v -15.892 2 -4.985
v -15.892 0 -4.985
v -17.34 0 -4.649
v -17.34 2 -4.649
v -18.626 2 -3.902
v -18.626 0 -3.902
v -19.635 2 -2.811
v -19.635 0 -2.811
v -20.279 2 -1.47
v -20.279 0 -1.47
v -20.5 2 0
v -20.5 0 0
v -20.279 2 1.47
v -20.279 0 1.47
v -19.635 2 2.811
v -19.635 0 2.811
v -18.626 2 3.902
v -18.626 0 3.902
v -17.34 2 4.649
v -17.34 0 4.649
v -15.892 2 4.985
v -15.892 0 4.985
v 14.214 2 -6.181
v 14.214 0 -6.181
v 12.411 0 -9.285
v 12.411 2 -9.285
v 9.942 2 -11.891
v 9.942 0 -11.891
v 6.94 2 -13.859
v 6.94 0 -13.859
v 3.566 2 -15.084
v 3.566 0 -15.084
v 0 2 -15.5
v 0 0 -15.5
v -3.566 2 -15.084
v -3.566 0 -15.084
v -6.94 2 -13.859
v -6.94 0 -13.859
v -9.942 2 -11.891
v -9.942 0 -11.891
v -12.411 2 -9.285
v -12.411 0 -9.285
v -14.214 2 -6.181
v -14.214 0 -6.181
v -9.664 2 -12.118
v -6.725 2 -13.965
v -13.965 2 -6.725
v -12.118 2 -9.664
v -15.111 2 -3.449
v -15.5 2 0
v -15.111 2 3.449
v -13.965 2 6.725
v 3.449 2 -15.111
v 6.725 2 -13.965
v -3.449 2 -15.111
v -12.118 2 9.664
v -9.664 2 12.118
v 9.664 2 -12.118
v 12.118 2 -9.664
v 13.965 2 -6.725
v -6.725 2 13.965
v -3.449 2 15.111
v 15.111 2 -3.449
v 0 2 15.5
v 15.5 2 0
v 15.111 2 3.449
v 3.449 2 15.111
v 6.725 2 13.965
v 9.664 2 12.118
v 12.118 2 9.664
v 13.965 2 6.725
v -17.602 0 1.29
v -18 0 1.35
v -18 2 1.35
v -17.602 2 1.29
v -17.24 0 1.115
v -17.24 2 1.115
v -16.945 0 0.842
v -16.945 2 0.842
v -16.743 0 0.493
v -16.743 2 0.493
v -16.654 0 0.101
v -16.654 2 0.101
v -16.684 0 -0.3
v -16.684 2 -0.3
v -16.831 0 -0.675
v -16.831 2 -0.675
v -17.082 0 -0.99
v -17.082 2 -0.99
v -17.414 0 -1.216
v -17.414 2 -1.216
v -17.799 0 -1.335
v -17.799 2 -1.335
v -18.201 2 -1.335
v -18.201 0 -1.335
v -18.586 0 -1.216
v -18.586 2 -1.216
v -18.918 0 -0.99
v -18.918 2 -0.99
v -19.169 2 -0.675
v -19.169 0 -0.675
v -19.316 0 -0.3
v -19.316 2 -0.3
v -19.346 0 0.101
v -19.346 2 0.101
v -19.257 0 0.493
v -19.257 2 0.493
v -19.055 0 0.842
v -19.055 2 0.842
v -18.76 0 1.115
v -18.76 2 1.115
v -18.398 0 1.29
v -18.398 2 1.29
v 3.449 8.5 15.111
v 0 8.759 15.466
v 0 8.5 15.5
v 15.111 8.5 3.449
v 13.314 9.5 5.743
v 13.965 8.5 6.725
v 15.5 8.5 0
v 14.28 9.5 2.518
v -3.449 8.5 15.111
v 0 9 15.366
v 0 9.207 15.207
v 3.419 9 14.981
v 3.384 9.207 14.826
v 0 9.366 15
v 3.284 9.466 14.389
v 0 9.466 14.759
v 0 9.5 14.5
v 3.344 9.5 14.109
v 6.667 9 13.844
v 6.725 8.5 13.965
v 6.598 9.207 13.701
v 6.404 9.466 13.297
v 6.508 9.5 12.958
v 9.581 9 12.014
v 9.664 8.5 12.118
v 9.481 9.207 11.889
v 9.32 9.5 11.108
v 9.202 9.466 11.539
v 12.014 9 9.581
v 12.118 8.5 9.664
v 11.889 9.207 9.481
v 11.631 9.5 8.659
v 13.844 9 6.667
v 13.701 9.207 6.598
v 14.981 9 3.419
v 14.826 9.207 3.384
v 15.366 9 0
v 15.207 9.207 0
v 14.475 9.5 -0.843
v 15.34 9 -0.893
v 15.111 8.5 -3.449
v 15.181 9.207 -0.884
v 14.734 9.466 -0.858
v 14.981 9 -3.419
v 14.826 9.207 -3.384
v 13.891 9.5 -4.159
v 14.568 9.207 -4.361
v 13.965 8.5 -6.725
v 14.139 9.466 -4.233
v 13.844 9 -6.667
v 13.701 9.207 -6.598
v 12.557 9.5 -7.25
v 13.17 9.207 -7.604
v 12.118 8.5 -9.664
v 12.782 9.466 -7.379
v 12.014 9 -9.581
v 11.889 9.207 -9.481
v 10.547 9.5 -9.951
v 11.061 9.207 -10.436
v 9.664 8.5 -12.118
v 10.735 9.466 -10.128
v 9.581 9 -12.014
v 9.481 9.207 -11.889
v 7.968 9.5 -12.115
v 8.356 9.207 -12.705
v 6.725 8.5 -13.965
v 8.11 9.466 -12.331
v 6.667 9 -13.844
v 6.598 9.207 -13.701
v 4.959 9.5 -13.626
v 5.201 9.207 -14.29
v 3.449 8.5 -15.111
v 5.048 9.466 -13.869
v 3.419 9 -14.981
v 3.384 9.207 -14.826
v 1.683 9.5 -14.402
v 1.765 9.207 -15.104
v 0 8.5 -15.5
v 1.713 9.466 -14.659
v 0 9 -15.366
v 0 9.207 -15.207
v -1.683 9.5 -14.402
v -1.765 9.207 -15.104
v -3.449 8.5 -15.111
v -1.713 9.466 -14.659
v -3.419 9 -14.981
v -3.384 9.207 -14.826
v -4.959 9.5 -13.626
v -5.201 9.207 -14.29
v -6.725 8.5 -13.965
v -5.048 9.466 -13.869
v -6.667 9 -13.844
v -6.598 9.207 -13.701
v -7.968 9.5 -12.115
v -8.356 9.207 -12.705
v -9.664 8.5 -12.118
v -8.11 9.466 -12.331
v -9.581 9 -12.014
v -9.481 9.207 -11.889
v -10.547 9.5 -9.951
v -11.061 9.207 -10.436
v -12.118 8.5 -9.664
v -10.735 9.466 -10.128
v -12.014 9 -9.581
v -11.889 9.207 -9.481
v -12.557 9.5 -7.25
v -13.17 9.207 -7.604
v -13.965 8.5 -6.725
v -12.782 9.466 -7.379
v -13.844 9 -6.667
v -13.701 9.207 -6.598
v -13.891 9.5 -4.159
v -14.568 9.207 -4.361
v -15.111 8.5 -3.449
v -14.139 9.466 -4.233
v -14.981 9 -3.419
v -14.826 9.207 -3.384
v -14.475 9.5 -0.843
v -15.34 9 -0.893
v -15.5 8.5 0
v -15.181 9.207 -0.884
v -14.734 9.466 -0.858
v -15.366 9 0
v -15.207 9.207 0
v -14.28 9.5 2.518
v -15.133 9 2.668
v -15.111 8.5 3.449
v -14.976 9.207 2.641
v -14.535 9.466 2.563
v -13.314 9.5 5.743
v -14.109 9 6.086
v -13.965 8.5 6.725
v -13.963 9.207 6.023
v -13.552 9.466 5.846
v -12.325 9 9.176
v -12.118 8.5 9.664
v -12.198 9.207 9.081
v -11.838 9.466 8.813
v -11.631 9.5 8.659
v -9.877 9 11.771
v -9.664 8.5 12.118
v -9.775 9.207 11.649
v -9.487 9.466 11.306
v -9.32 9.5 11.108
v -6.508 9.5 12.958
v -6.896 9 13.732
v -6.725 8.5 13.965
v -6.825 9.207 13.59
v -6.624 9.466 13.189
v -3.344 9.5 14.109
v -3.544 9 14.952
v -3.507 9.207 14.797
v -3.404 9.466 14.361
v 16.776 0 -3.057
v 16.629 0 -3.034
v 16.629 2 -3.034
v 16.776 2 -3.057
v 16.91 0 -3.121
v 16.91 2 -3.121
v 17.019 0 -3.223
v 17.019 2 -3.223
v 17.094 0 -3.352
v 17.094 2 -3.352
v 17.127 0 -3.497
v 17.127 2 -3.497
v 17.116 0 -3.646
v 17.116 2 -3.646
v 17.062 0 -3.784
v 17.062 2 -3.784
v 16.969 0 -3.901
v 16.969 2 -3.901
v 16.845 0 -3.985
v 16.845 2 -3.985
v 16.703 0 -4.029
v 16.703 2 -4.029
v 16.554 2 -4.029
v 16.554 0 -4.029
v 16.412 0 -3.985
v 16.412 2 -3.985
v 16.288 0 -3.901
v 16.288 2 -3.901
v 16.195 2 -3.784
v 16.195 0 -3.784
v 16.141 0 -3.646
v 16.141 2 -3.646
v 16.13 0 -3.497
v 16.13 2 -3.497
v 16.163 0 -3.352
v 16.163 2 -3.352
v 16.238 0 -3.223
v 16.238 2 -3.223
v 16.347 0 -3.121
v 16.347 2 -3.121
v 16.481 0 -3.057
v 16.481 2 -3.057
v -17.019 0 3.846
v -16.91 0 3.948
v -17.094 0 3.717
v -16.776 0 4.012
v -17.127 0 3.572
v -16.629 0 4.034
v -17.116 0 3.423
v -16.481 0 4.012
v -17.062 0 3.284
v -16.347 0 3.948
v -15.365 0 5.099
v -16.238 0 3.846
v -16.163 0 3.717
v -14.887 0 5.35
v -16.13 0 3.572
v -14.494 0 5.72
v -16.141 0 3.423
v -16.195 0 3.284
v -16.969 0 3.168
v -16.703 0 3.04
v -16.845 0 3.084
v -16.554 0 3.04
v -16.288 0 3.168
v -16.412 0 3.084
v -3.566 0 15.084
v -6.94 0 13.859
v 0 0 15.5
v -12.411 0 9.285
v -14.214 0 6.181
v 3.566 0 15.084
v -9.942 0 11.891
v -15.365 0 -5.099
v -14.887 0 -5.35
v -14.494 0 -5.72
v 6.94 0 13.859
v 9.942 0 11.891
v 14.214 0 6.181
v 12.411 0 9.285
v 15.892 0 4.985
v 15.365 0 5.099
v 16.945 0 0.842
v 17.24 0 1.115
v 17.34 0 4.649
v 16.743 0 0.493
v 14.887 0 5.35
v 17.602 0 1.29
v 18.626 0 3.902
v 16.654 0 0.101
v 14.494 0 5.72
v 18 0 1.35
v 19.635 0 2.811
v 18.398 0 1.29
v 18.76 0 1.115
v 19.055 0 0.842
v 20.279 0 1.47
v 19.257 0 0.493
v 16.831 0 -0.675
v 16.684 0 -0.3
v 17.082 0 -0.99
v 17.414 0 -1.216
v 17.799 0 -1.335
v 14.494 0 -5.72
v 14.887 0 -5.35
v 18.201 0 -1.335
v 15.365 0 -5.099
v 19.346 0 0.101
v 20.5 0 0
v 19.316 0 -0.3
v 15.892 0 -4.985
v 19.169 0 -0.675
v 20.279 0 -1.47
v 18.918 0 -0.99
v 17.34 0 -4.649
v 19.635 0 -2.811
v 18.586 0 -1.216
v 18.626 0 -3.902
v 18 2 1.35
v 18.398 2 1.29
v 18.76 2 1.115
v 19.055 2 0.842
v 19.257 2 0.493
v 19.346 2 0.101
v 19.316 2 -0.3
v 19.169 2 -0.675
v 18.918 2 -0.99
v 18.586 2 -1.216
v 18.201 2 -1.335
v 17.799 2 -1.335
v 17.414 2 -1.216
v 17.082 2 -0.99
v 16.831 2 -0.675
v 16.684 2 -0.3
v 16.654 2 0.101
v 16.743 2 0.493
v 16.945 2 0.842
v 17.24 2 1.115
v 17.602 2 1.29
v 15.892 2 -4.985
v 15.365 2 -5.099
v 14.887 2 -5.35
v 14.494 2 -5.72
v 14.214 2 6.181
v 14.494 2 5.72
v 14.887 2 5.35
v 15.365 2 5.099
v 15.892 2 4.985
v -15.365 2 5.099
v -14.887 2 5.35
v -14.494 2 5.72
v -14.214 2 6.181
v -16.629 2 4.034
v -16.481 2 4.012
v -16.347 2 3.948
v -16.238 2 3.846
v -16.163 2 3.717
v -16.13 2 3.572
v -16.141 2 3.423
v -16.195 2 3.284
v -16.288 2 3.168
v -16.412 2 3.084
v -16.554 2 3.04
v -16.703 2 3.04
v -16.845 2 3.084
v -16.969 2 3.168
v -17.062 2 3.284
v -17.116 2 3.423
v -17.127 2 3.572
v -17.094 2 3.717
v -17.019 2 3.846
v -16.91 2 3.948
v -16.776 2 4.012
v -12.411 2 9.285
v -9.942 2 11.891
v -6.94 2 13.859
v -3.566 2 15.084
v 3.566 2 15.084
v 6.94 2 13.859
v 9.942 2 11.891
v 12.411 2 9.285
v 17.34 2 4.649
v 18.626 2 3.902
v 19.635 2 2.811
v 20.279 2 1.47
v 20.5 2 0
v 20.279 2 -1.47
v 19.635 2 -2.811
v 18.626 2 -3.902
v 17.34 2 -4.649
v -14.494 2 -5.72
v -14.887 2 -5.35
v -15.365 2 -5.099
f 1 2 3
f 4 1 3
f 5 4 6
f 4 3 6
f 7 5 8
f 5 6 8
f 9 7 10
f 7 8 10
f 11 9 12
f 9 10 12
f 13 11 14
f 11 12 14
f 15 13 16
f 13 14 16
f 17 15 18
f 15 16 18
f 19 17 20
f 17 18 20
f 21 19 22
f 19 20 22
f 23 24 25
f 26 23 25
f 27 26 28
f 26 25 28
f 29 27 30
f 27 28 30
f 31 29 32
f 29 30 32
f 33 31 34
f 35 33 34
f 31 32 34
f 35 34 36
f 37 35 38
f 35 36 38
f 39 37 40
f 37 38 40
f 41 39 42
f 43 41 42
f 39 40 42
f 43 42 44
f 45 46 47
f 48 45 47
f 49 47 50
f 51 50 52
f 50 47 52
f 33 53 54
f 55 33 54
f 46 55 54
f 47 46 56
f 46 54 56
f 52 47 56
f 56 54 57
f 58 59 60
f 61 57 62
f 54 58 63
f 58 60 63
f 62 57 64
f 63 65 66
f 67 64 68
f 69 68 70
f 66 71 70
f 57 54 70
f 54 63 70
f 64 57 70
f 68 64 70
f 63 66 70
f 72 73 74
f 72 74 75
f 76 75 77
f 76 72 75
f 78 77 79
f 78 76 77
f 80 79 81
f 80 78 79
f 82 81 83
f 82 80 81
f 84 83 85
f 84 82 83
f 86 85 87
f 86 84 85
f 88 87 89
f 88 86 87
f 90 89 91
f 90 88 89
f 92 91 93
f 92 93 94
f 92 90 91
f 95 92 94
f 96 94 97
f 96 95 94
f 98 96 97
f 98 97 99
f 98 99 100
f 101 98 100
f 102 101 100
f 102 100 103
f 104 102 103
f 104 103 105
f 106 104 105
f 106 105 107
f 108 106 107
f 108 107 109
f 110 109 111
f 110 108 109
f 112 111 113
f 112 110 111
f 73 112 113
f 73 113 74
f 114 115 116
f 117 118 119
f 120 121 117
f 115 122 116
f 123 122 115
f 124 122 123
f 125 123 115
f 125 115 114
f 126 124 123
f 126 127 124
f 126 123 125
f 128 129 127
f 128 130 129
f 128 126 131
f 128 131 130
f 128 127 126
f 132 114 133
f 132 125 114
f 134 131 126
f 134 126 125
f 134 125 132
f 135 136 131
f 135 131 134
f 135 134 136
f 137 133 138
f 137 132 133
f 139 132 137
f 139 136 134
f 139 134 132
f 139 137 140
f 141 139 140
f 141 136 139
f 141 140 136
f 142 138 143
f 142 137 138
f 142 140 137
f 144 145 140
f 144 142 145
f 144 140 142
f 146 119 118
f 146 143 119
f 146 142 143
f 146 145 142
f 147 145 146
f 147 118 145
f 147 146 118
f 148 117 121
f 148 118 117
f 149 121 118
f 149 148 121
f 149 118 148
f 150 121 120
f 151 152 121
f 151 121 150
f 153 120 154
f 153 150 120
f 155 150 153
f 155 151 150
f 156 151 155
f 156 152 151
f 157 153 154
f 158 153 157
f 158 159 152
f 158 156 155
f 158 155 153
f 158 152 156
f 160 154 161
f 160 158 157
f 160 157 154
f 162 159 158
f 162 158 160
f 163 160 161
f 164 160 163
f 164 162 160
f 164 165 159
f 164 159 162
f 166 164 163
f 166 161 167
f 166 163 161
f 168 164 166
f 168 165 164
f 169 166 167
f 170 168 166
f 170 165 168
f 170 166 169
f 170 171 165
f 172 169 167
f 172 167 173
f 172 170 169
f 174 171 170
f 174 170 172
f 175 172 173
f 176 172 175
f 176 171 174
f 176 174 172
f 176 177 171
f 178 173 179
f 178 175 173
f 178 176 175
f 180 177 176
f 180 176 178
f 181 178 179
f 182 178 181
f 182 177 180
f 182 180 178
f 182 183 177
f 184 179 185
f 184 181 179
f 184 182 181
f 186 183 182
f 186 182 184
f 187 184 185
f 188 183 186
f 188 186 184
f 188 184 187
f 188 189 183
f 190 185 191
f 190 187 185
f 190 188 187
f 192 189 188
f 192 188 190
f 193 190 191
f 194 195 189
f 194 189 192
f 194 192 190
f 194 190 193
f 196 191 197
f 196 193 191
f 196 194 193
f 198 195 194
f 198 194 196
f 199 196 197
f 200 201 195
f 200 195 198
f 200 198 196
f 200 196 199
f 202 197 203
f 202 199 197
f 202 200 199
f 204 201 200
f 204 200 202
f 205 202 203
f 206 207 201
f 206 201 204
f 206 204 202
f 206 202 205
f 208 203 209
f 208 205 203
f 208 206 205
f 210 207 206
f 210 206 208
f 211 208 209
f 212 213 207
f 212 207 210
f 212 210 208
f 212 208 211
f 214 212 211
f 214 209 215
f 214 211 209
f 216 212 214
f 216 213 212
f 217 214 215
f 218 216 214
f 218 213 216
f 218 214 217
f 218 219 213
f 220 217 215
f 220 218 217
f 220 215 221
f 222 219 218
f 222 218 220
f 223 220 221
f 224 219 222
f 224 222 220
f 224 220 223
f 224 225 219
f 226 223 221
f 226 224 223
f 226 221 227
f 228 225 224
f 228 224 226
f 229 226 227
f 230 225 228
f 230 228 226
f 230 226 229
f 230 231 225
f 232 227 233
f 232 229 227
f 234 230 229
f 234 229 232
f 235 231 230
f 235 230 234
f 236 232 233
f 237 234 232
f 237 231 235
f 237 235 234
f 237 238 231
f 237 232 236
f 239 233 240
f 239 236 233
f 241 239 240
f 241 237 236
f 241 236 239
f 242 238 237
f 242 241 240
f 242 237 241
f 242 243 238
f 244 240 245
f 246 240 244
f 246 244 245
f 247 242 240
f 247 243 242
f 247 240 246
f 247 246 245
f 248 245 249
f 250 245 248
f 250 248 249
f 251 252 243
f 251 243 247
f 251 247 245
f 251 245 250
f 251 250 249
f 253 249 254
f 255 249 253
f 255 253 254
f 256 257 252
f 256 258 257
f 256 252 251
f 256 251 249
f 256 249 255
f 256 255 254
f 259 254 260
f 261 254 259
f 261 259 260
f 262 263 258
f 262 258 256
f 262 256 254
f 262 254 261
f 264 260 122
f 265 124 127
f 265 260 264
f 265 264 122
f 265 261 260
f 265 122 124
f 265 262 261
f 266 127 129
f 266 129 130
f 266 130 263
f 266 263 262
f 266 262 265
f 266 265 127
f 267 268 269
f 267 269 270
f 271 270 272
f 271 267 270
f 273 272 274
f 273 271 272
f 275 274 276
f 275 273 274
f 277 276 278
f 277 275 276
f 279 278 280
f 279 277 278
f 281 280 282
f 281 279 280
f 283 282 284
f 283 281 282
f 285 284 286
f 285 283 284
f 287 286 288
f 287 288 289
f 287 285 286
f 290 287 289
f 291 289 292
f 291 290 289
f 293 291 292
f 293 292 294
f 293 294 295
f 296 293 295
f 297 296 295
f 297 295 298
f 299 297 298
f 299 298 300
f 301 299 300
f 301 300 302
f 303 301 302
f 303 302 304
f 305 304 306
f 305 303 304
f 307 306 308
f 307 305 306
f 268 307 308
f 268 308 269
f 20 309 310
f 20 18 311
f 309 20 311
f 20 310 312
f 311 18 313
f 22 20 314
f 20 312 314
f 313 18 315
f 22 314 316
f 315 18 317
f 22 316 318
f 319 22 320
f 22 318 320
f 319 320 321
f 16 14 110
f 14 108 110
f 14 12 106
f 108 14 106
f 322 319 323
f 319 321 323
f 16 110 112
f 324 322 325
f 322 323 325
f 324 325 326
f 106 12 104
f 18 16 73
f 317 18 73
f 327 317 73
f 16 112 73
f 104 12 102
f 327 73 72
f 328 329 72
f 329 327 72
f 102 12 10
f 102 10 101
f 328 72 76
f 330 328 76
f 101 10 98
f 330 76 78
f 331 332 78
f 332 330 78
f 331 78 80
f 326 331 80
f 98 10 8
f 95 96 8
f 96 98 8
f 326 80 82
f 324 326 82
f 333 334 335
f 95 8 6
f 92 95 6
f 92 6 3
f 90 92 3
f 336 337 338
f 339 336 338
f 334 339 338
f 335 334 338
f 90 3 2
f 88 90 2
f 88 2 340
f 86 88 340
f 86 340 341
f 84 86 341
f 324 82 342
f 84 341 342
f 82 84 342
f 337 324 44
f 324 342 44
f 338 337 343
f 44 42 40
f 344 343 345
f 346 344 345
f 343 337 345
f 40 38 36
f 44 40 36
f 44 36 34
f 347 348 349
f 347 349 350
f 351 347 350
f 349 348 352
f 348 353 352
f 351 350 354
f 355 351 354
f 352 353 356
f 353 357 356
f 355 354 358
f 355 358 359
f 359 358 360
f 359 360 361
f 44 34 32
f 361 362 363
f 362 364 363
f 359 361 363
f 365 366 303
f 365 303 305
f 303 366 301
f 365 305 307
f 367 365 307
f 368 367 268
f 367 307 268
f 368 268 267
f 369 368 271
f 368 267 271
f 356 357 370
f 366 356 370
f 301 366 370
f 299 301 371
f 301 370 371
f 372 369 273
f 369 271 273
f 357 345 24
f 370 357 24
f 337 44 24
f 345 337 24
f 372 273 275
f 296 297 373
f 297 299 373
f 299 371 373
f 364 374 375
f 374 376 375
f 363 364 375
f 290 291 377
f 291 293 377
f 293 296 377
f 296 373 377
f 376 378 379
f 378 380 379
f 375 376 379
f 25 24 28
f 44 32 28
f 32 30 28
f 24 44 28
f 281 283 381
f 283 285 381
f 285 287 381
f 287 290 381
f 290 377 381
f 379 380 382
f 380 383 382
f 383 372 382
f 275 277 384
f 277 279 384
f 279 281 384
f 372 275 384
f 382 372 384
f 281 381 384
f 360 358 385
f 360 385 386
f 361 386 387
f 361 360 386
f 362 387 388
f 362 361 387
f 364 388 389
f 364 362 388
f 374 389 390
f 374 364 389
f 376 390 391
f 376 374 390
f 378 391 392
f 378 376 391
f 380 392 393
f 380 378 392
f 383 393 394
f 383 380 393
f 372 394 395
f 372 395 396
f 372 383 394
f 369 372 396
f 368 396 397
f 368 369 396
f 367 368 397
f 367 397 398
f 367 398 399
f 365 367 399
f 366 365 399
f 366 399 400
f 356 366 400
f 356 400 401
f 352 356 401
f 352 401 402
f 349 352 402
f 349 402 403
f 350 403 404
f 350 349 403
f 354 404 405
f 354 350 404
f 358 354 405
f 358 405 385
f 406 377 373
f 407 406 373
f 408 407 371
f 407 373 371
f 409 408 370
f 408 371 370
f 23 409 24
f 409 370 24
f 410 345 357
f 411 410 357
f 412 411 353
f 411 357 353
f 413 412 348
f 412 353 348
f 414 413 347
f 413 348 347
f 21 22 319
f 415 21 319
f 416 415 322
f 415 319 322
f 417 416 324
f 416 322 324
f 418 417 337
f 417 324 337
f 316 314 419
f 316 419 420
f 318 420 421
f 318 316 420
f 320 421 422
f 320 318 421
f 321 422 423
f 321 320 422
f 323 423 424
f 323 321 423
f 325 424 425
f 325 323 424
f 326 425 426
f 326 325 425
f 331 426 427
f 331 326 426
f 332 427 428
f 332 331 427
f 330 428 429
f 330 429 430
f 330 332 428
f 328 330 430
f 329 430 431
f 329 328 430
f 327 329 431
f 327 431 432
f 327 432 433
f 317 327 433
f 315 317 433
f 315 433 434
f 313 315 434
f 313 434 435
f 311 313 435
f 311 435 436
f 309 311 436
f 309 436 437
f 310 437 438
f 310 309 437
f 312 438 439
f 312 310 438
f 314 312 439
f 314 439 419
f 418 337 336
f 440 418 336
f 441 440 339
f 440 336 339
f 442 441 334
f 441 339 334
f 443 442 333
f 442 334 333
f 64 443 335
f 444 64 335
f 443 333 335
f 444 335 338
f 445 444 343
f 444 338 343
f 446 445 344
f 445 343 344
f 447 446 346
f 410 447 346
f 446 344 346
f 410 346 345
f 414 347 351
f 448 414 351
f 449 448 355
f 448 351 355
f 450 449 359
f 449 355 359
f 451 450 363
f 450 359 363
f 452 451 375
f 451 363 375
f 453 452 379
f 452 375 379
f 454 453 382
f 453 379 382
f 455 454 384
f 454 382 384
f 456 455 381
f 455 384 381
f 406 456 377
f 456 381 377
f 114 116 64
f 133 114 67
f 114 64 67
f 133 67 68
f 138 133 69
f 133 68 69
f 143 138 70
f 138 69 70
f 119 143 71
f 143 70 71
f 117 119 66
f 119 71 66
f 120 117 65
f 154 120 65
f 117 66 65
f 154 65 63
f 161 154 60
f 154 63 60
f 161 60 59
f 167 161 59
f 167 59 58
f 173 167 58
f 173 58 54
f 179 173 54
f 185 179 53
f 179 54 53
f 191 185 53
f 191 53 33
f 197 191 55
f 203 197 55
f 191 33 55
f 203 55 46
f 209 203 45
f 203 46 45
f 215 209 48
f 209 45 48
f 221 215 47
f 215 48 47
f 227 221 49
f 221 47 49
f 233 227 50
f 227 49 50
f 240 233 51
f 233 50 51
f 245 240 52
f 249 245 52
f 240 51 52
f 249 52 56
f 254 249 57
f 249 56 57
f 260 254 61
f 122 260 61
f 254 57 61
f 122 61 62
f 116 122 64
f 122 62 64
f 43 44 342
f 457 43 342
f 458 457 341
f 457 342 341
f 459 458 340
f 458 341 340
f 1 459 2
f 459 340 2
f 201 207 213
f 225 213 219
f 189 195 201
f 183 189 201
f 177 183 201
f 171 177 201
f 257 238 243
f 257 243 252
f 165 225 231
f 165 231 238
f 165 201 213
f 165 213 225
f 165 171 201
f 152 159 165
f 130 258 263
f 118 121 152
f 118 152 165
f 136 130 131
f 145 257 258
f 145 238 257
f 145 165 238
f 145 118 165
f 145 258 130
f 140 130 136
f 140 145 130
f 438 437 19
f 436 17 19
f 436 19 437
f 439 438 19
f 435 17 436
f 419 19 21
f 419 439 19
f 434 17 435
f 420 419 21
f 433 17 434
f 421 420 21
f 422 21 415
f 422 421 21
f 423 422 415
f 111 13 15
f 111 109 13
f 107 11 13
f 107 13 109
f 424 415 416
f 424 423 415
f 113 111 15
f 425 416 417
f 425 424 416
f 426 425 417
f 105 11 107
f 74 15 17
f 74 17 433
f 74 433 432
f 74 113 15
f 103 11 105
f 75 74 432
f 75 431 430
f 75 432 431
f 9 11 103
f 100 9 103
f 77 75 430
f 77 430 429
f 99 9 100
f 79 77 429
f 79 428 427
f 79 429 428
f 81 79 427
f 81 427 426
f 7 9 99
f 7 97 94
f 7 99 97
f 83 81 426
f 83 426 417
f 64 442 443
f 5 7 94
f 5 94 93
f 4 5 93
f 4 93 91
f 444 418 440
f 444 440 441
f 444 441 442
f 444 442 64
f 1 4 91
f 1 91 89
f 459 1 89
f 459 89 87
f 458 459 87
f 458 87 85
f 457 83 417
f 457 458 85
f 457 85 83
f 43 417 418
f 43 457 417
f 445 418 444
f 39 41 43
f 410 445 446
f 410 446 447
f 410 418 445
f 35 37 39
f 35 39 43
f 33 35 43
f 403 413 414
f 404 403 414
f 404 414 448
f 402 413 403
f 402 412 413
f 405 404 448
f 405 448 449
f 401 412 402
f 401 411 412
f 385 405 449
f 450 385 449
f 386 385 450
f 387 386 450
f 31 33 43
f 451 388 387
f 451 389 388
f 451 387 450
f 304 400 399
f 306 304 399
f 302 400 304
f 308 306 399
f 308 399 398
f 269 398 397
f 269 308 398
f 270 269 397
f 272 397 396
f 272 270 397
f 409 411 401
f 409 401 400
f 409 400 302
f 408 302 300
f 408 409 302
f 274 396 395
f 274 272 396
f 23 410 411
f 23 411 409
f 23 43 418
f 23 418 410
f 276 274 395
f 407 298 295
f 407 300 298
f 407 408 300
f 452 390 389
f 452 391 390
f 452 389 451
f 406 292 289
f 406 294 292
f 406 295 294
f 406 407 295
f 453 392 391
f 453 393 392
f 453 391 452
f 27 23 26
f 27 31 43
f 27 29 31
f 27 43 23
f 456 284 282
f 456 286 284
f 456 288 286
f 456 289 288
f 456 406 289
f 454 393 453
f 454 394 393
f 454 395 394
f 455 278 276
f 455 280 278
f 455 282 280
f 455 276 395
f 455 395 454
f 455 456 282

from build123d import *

# Parameters (mm, degrees)
SKETCH1_R           = 1.35
SKETCH1_R_2         = 0.5
BOSS_EXTRUDE1_DEPTH = 2
SKETCH2_R           = 15.5
BOSS_EXTRUDE2_DEPTH = 7.5
FILLET1_R           = 1


with BuildPart() as part:
    # Sketch1 → Boss-Extrude1 (new body)
    with BuildSketch(Plane(origin=(0, 0, 0), x_dir=(1, 0, 0), z_dir=(0, 1, 0))):
        with BuildLine():
            ThreePointArc((-14.214285714, -6.180945044), (0, -15.5), (14.214285714, -6.180945044))
            ThreePointArc((14.214285714, -6.180945044), (14.887096774, -5.35017286), (15.891705069, -4.9846331))
            ThreePointArc((15.891705069, -4.9846331), (20.5, 0), (15.891705069, 4.9846331))
            ThreePointArc((15.891705069, 4.9846331), (14.887096774, 5.35017286), (14.214285714, 6.180945044))
            ThreePointArc((14.214285714, 6.180945044), (0, 15.5), (-14.214285714, 6.180945044))
            ThreePointArc((-14.214285714, 6.180945044), (-14.887096774, 5.35017286), (-15.891705069, 4.9846331))
            ThreePointArc((-15.891705069, 4.9846331), (-20.5, 0), (-15.891705069, -4.9846331))
            ThreePointArc((-15.891705069, -4.9846331), (-14.887096774, -5.35017286), (-14.214285714, -6.180945044))
        make_face()
        with Locations(Location((-18, 0, 0), (0, 0, 270))):
            Circle(SKETCH1_R, mode=Mode.SUBTRACT)
        with Locations(Location((18, 0, 0), (0, 0, 270))):
            Circle(SKETCH1_R, mode=Mode.SUBTRACT)
        with Locations(Location((16.628509212, 3.534498744, 0), (0, 0, 270))):
            Circle(SKETCH1_R_2, mode=Mode.SUBTRACT)
        with Locations(Location((-16.628509212, -3.534498744, 0), (0, 0, 270))):
            Circle(SKETCH1_R_2, mode=Mode.SUBTRACT)
    extrude(amount=BOSS_EXTRUDE1_DEPTH)


with BuildPart() as body_2:
    # Sketch2 → Boss-Extrude2 (new body)
    with BuildSketch(Plane(origin=(0, 2, 0), x_dir=(1, 0, 0), z_dir=(0, 1, 0))):
        with Locations(Location((0, 0, 0), (0, 0, 270))):
            Circle(SKETCH2_R)
    extrude(amount=BOSS_EXTRUDE2_DEPTH)

    # Fillet1
    fillet1_edges = [body_2.edges().sort_by_distance(p)[0] for p in [
        (0, 9.5, -15.5),
    ]]
    fillet(fillet1_edges, radius=FILLET1_R)


solid = Compound([part.part, body_2.part])
